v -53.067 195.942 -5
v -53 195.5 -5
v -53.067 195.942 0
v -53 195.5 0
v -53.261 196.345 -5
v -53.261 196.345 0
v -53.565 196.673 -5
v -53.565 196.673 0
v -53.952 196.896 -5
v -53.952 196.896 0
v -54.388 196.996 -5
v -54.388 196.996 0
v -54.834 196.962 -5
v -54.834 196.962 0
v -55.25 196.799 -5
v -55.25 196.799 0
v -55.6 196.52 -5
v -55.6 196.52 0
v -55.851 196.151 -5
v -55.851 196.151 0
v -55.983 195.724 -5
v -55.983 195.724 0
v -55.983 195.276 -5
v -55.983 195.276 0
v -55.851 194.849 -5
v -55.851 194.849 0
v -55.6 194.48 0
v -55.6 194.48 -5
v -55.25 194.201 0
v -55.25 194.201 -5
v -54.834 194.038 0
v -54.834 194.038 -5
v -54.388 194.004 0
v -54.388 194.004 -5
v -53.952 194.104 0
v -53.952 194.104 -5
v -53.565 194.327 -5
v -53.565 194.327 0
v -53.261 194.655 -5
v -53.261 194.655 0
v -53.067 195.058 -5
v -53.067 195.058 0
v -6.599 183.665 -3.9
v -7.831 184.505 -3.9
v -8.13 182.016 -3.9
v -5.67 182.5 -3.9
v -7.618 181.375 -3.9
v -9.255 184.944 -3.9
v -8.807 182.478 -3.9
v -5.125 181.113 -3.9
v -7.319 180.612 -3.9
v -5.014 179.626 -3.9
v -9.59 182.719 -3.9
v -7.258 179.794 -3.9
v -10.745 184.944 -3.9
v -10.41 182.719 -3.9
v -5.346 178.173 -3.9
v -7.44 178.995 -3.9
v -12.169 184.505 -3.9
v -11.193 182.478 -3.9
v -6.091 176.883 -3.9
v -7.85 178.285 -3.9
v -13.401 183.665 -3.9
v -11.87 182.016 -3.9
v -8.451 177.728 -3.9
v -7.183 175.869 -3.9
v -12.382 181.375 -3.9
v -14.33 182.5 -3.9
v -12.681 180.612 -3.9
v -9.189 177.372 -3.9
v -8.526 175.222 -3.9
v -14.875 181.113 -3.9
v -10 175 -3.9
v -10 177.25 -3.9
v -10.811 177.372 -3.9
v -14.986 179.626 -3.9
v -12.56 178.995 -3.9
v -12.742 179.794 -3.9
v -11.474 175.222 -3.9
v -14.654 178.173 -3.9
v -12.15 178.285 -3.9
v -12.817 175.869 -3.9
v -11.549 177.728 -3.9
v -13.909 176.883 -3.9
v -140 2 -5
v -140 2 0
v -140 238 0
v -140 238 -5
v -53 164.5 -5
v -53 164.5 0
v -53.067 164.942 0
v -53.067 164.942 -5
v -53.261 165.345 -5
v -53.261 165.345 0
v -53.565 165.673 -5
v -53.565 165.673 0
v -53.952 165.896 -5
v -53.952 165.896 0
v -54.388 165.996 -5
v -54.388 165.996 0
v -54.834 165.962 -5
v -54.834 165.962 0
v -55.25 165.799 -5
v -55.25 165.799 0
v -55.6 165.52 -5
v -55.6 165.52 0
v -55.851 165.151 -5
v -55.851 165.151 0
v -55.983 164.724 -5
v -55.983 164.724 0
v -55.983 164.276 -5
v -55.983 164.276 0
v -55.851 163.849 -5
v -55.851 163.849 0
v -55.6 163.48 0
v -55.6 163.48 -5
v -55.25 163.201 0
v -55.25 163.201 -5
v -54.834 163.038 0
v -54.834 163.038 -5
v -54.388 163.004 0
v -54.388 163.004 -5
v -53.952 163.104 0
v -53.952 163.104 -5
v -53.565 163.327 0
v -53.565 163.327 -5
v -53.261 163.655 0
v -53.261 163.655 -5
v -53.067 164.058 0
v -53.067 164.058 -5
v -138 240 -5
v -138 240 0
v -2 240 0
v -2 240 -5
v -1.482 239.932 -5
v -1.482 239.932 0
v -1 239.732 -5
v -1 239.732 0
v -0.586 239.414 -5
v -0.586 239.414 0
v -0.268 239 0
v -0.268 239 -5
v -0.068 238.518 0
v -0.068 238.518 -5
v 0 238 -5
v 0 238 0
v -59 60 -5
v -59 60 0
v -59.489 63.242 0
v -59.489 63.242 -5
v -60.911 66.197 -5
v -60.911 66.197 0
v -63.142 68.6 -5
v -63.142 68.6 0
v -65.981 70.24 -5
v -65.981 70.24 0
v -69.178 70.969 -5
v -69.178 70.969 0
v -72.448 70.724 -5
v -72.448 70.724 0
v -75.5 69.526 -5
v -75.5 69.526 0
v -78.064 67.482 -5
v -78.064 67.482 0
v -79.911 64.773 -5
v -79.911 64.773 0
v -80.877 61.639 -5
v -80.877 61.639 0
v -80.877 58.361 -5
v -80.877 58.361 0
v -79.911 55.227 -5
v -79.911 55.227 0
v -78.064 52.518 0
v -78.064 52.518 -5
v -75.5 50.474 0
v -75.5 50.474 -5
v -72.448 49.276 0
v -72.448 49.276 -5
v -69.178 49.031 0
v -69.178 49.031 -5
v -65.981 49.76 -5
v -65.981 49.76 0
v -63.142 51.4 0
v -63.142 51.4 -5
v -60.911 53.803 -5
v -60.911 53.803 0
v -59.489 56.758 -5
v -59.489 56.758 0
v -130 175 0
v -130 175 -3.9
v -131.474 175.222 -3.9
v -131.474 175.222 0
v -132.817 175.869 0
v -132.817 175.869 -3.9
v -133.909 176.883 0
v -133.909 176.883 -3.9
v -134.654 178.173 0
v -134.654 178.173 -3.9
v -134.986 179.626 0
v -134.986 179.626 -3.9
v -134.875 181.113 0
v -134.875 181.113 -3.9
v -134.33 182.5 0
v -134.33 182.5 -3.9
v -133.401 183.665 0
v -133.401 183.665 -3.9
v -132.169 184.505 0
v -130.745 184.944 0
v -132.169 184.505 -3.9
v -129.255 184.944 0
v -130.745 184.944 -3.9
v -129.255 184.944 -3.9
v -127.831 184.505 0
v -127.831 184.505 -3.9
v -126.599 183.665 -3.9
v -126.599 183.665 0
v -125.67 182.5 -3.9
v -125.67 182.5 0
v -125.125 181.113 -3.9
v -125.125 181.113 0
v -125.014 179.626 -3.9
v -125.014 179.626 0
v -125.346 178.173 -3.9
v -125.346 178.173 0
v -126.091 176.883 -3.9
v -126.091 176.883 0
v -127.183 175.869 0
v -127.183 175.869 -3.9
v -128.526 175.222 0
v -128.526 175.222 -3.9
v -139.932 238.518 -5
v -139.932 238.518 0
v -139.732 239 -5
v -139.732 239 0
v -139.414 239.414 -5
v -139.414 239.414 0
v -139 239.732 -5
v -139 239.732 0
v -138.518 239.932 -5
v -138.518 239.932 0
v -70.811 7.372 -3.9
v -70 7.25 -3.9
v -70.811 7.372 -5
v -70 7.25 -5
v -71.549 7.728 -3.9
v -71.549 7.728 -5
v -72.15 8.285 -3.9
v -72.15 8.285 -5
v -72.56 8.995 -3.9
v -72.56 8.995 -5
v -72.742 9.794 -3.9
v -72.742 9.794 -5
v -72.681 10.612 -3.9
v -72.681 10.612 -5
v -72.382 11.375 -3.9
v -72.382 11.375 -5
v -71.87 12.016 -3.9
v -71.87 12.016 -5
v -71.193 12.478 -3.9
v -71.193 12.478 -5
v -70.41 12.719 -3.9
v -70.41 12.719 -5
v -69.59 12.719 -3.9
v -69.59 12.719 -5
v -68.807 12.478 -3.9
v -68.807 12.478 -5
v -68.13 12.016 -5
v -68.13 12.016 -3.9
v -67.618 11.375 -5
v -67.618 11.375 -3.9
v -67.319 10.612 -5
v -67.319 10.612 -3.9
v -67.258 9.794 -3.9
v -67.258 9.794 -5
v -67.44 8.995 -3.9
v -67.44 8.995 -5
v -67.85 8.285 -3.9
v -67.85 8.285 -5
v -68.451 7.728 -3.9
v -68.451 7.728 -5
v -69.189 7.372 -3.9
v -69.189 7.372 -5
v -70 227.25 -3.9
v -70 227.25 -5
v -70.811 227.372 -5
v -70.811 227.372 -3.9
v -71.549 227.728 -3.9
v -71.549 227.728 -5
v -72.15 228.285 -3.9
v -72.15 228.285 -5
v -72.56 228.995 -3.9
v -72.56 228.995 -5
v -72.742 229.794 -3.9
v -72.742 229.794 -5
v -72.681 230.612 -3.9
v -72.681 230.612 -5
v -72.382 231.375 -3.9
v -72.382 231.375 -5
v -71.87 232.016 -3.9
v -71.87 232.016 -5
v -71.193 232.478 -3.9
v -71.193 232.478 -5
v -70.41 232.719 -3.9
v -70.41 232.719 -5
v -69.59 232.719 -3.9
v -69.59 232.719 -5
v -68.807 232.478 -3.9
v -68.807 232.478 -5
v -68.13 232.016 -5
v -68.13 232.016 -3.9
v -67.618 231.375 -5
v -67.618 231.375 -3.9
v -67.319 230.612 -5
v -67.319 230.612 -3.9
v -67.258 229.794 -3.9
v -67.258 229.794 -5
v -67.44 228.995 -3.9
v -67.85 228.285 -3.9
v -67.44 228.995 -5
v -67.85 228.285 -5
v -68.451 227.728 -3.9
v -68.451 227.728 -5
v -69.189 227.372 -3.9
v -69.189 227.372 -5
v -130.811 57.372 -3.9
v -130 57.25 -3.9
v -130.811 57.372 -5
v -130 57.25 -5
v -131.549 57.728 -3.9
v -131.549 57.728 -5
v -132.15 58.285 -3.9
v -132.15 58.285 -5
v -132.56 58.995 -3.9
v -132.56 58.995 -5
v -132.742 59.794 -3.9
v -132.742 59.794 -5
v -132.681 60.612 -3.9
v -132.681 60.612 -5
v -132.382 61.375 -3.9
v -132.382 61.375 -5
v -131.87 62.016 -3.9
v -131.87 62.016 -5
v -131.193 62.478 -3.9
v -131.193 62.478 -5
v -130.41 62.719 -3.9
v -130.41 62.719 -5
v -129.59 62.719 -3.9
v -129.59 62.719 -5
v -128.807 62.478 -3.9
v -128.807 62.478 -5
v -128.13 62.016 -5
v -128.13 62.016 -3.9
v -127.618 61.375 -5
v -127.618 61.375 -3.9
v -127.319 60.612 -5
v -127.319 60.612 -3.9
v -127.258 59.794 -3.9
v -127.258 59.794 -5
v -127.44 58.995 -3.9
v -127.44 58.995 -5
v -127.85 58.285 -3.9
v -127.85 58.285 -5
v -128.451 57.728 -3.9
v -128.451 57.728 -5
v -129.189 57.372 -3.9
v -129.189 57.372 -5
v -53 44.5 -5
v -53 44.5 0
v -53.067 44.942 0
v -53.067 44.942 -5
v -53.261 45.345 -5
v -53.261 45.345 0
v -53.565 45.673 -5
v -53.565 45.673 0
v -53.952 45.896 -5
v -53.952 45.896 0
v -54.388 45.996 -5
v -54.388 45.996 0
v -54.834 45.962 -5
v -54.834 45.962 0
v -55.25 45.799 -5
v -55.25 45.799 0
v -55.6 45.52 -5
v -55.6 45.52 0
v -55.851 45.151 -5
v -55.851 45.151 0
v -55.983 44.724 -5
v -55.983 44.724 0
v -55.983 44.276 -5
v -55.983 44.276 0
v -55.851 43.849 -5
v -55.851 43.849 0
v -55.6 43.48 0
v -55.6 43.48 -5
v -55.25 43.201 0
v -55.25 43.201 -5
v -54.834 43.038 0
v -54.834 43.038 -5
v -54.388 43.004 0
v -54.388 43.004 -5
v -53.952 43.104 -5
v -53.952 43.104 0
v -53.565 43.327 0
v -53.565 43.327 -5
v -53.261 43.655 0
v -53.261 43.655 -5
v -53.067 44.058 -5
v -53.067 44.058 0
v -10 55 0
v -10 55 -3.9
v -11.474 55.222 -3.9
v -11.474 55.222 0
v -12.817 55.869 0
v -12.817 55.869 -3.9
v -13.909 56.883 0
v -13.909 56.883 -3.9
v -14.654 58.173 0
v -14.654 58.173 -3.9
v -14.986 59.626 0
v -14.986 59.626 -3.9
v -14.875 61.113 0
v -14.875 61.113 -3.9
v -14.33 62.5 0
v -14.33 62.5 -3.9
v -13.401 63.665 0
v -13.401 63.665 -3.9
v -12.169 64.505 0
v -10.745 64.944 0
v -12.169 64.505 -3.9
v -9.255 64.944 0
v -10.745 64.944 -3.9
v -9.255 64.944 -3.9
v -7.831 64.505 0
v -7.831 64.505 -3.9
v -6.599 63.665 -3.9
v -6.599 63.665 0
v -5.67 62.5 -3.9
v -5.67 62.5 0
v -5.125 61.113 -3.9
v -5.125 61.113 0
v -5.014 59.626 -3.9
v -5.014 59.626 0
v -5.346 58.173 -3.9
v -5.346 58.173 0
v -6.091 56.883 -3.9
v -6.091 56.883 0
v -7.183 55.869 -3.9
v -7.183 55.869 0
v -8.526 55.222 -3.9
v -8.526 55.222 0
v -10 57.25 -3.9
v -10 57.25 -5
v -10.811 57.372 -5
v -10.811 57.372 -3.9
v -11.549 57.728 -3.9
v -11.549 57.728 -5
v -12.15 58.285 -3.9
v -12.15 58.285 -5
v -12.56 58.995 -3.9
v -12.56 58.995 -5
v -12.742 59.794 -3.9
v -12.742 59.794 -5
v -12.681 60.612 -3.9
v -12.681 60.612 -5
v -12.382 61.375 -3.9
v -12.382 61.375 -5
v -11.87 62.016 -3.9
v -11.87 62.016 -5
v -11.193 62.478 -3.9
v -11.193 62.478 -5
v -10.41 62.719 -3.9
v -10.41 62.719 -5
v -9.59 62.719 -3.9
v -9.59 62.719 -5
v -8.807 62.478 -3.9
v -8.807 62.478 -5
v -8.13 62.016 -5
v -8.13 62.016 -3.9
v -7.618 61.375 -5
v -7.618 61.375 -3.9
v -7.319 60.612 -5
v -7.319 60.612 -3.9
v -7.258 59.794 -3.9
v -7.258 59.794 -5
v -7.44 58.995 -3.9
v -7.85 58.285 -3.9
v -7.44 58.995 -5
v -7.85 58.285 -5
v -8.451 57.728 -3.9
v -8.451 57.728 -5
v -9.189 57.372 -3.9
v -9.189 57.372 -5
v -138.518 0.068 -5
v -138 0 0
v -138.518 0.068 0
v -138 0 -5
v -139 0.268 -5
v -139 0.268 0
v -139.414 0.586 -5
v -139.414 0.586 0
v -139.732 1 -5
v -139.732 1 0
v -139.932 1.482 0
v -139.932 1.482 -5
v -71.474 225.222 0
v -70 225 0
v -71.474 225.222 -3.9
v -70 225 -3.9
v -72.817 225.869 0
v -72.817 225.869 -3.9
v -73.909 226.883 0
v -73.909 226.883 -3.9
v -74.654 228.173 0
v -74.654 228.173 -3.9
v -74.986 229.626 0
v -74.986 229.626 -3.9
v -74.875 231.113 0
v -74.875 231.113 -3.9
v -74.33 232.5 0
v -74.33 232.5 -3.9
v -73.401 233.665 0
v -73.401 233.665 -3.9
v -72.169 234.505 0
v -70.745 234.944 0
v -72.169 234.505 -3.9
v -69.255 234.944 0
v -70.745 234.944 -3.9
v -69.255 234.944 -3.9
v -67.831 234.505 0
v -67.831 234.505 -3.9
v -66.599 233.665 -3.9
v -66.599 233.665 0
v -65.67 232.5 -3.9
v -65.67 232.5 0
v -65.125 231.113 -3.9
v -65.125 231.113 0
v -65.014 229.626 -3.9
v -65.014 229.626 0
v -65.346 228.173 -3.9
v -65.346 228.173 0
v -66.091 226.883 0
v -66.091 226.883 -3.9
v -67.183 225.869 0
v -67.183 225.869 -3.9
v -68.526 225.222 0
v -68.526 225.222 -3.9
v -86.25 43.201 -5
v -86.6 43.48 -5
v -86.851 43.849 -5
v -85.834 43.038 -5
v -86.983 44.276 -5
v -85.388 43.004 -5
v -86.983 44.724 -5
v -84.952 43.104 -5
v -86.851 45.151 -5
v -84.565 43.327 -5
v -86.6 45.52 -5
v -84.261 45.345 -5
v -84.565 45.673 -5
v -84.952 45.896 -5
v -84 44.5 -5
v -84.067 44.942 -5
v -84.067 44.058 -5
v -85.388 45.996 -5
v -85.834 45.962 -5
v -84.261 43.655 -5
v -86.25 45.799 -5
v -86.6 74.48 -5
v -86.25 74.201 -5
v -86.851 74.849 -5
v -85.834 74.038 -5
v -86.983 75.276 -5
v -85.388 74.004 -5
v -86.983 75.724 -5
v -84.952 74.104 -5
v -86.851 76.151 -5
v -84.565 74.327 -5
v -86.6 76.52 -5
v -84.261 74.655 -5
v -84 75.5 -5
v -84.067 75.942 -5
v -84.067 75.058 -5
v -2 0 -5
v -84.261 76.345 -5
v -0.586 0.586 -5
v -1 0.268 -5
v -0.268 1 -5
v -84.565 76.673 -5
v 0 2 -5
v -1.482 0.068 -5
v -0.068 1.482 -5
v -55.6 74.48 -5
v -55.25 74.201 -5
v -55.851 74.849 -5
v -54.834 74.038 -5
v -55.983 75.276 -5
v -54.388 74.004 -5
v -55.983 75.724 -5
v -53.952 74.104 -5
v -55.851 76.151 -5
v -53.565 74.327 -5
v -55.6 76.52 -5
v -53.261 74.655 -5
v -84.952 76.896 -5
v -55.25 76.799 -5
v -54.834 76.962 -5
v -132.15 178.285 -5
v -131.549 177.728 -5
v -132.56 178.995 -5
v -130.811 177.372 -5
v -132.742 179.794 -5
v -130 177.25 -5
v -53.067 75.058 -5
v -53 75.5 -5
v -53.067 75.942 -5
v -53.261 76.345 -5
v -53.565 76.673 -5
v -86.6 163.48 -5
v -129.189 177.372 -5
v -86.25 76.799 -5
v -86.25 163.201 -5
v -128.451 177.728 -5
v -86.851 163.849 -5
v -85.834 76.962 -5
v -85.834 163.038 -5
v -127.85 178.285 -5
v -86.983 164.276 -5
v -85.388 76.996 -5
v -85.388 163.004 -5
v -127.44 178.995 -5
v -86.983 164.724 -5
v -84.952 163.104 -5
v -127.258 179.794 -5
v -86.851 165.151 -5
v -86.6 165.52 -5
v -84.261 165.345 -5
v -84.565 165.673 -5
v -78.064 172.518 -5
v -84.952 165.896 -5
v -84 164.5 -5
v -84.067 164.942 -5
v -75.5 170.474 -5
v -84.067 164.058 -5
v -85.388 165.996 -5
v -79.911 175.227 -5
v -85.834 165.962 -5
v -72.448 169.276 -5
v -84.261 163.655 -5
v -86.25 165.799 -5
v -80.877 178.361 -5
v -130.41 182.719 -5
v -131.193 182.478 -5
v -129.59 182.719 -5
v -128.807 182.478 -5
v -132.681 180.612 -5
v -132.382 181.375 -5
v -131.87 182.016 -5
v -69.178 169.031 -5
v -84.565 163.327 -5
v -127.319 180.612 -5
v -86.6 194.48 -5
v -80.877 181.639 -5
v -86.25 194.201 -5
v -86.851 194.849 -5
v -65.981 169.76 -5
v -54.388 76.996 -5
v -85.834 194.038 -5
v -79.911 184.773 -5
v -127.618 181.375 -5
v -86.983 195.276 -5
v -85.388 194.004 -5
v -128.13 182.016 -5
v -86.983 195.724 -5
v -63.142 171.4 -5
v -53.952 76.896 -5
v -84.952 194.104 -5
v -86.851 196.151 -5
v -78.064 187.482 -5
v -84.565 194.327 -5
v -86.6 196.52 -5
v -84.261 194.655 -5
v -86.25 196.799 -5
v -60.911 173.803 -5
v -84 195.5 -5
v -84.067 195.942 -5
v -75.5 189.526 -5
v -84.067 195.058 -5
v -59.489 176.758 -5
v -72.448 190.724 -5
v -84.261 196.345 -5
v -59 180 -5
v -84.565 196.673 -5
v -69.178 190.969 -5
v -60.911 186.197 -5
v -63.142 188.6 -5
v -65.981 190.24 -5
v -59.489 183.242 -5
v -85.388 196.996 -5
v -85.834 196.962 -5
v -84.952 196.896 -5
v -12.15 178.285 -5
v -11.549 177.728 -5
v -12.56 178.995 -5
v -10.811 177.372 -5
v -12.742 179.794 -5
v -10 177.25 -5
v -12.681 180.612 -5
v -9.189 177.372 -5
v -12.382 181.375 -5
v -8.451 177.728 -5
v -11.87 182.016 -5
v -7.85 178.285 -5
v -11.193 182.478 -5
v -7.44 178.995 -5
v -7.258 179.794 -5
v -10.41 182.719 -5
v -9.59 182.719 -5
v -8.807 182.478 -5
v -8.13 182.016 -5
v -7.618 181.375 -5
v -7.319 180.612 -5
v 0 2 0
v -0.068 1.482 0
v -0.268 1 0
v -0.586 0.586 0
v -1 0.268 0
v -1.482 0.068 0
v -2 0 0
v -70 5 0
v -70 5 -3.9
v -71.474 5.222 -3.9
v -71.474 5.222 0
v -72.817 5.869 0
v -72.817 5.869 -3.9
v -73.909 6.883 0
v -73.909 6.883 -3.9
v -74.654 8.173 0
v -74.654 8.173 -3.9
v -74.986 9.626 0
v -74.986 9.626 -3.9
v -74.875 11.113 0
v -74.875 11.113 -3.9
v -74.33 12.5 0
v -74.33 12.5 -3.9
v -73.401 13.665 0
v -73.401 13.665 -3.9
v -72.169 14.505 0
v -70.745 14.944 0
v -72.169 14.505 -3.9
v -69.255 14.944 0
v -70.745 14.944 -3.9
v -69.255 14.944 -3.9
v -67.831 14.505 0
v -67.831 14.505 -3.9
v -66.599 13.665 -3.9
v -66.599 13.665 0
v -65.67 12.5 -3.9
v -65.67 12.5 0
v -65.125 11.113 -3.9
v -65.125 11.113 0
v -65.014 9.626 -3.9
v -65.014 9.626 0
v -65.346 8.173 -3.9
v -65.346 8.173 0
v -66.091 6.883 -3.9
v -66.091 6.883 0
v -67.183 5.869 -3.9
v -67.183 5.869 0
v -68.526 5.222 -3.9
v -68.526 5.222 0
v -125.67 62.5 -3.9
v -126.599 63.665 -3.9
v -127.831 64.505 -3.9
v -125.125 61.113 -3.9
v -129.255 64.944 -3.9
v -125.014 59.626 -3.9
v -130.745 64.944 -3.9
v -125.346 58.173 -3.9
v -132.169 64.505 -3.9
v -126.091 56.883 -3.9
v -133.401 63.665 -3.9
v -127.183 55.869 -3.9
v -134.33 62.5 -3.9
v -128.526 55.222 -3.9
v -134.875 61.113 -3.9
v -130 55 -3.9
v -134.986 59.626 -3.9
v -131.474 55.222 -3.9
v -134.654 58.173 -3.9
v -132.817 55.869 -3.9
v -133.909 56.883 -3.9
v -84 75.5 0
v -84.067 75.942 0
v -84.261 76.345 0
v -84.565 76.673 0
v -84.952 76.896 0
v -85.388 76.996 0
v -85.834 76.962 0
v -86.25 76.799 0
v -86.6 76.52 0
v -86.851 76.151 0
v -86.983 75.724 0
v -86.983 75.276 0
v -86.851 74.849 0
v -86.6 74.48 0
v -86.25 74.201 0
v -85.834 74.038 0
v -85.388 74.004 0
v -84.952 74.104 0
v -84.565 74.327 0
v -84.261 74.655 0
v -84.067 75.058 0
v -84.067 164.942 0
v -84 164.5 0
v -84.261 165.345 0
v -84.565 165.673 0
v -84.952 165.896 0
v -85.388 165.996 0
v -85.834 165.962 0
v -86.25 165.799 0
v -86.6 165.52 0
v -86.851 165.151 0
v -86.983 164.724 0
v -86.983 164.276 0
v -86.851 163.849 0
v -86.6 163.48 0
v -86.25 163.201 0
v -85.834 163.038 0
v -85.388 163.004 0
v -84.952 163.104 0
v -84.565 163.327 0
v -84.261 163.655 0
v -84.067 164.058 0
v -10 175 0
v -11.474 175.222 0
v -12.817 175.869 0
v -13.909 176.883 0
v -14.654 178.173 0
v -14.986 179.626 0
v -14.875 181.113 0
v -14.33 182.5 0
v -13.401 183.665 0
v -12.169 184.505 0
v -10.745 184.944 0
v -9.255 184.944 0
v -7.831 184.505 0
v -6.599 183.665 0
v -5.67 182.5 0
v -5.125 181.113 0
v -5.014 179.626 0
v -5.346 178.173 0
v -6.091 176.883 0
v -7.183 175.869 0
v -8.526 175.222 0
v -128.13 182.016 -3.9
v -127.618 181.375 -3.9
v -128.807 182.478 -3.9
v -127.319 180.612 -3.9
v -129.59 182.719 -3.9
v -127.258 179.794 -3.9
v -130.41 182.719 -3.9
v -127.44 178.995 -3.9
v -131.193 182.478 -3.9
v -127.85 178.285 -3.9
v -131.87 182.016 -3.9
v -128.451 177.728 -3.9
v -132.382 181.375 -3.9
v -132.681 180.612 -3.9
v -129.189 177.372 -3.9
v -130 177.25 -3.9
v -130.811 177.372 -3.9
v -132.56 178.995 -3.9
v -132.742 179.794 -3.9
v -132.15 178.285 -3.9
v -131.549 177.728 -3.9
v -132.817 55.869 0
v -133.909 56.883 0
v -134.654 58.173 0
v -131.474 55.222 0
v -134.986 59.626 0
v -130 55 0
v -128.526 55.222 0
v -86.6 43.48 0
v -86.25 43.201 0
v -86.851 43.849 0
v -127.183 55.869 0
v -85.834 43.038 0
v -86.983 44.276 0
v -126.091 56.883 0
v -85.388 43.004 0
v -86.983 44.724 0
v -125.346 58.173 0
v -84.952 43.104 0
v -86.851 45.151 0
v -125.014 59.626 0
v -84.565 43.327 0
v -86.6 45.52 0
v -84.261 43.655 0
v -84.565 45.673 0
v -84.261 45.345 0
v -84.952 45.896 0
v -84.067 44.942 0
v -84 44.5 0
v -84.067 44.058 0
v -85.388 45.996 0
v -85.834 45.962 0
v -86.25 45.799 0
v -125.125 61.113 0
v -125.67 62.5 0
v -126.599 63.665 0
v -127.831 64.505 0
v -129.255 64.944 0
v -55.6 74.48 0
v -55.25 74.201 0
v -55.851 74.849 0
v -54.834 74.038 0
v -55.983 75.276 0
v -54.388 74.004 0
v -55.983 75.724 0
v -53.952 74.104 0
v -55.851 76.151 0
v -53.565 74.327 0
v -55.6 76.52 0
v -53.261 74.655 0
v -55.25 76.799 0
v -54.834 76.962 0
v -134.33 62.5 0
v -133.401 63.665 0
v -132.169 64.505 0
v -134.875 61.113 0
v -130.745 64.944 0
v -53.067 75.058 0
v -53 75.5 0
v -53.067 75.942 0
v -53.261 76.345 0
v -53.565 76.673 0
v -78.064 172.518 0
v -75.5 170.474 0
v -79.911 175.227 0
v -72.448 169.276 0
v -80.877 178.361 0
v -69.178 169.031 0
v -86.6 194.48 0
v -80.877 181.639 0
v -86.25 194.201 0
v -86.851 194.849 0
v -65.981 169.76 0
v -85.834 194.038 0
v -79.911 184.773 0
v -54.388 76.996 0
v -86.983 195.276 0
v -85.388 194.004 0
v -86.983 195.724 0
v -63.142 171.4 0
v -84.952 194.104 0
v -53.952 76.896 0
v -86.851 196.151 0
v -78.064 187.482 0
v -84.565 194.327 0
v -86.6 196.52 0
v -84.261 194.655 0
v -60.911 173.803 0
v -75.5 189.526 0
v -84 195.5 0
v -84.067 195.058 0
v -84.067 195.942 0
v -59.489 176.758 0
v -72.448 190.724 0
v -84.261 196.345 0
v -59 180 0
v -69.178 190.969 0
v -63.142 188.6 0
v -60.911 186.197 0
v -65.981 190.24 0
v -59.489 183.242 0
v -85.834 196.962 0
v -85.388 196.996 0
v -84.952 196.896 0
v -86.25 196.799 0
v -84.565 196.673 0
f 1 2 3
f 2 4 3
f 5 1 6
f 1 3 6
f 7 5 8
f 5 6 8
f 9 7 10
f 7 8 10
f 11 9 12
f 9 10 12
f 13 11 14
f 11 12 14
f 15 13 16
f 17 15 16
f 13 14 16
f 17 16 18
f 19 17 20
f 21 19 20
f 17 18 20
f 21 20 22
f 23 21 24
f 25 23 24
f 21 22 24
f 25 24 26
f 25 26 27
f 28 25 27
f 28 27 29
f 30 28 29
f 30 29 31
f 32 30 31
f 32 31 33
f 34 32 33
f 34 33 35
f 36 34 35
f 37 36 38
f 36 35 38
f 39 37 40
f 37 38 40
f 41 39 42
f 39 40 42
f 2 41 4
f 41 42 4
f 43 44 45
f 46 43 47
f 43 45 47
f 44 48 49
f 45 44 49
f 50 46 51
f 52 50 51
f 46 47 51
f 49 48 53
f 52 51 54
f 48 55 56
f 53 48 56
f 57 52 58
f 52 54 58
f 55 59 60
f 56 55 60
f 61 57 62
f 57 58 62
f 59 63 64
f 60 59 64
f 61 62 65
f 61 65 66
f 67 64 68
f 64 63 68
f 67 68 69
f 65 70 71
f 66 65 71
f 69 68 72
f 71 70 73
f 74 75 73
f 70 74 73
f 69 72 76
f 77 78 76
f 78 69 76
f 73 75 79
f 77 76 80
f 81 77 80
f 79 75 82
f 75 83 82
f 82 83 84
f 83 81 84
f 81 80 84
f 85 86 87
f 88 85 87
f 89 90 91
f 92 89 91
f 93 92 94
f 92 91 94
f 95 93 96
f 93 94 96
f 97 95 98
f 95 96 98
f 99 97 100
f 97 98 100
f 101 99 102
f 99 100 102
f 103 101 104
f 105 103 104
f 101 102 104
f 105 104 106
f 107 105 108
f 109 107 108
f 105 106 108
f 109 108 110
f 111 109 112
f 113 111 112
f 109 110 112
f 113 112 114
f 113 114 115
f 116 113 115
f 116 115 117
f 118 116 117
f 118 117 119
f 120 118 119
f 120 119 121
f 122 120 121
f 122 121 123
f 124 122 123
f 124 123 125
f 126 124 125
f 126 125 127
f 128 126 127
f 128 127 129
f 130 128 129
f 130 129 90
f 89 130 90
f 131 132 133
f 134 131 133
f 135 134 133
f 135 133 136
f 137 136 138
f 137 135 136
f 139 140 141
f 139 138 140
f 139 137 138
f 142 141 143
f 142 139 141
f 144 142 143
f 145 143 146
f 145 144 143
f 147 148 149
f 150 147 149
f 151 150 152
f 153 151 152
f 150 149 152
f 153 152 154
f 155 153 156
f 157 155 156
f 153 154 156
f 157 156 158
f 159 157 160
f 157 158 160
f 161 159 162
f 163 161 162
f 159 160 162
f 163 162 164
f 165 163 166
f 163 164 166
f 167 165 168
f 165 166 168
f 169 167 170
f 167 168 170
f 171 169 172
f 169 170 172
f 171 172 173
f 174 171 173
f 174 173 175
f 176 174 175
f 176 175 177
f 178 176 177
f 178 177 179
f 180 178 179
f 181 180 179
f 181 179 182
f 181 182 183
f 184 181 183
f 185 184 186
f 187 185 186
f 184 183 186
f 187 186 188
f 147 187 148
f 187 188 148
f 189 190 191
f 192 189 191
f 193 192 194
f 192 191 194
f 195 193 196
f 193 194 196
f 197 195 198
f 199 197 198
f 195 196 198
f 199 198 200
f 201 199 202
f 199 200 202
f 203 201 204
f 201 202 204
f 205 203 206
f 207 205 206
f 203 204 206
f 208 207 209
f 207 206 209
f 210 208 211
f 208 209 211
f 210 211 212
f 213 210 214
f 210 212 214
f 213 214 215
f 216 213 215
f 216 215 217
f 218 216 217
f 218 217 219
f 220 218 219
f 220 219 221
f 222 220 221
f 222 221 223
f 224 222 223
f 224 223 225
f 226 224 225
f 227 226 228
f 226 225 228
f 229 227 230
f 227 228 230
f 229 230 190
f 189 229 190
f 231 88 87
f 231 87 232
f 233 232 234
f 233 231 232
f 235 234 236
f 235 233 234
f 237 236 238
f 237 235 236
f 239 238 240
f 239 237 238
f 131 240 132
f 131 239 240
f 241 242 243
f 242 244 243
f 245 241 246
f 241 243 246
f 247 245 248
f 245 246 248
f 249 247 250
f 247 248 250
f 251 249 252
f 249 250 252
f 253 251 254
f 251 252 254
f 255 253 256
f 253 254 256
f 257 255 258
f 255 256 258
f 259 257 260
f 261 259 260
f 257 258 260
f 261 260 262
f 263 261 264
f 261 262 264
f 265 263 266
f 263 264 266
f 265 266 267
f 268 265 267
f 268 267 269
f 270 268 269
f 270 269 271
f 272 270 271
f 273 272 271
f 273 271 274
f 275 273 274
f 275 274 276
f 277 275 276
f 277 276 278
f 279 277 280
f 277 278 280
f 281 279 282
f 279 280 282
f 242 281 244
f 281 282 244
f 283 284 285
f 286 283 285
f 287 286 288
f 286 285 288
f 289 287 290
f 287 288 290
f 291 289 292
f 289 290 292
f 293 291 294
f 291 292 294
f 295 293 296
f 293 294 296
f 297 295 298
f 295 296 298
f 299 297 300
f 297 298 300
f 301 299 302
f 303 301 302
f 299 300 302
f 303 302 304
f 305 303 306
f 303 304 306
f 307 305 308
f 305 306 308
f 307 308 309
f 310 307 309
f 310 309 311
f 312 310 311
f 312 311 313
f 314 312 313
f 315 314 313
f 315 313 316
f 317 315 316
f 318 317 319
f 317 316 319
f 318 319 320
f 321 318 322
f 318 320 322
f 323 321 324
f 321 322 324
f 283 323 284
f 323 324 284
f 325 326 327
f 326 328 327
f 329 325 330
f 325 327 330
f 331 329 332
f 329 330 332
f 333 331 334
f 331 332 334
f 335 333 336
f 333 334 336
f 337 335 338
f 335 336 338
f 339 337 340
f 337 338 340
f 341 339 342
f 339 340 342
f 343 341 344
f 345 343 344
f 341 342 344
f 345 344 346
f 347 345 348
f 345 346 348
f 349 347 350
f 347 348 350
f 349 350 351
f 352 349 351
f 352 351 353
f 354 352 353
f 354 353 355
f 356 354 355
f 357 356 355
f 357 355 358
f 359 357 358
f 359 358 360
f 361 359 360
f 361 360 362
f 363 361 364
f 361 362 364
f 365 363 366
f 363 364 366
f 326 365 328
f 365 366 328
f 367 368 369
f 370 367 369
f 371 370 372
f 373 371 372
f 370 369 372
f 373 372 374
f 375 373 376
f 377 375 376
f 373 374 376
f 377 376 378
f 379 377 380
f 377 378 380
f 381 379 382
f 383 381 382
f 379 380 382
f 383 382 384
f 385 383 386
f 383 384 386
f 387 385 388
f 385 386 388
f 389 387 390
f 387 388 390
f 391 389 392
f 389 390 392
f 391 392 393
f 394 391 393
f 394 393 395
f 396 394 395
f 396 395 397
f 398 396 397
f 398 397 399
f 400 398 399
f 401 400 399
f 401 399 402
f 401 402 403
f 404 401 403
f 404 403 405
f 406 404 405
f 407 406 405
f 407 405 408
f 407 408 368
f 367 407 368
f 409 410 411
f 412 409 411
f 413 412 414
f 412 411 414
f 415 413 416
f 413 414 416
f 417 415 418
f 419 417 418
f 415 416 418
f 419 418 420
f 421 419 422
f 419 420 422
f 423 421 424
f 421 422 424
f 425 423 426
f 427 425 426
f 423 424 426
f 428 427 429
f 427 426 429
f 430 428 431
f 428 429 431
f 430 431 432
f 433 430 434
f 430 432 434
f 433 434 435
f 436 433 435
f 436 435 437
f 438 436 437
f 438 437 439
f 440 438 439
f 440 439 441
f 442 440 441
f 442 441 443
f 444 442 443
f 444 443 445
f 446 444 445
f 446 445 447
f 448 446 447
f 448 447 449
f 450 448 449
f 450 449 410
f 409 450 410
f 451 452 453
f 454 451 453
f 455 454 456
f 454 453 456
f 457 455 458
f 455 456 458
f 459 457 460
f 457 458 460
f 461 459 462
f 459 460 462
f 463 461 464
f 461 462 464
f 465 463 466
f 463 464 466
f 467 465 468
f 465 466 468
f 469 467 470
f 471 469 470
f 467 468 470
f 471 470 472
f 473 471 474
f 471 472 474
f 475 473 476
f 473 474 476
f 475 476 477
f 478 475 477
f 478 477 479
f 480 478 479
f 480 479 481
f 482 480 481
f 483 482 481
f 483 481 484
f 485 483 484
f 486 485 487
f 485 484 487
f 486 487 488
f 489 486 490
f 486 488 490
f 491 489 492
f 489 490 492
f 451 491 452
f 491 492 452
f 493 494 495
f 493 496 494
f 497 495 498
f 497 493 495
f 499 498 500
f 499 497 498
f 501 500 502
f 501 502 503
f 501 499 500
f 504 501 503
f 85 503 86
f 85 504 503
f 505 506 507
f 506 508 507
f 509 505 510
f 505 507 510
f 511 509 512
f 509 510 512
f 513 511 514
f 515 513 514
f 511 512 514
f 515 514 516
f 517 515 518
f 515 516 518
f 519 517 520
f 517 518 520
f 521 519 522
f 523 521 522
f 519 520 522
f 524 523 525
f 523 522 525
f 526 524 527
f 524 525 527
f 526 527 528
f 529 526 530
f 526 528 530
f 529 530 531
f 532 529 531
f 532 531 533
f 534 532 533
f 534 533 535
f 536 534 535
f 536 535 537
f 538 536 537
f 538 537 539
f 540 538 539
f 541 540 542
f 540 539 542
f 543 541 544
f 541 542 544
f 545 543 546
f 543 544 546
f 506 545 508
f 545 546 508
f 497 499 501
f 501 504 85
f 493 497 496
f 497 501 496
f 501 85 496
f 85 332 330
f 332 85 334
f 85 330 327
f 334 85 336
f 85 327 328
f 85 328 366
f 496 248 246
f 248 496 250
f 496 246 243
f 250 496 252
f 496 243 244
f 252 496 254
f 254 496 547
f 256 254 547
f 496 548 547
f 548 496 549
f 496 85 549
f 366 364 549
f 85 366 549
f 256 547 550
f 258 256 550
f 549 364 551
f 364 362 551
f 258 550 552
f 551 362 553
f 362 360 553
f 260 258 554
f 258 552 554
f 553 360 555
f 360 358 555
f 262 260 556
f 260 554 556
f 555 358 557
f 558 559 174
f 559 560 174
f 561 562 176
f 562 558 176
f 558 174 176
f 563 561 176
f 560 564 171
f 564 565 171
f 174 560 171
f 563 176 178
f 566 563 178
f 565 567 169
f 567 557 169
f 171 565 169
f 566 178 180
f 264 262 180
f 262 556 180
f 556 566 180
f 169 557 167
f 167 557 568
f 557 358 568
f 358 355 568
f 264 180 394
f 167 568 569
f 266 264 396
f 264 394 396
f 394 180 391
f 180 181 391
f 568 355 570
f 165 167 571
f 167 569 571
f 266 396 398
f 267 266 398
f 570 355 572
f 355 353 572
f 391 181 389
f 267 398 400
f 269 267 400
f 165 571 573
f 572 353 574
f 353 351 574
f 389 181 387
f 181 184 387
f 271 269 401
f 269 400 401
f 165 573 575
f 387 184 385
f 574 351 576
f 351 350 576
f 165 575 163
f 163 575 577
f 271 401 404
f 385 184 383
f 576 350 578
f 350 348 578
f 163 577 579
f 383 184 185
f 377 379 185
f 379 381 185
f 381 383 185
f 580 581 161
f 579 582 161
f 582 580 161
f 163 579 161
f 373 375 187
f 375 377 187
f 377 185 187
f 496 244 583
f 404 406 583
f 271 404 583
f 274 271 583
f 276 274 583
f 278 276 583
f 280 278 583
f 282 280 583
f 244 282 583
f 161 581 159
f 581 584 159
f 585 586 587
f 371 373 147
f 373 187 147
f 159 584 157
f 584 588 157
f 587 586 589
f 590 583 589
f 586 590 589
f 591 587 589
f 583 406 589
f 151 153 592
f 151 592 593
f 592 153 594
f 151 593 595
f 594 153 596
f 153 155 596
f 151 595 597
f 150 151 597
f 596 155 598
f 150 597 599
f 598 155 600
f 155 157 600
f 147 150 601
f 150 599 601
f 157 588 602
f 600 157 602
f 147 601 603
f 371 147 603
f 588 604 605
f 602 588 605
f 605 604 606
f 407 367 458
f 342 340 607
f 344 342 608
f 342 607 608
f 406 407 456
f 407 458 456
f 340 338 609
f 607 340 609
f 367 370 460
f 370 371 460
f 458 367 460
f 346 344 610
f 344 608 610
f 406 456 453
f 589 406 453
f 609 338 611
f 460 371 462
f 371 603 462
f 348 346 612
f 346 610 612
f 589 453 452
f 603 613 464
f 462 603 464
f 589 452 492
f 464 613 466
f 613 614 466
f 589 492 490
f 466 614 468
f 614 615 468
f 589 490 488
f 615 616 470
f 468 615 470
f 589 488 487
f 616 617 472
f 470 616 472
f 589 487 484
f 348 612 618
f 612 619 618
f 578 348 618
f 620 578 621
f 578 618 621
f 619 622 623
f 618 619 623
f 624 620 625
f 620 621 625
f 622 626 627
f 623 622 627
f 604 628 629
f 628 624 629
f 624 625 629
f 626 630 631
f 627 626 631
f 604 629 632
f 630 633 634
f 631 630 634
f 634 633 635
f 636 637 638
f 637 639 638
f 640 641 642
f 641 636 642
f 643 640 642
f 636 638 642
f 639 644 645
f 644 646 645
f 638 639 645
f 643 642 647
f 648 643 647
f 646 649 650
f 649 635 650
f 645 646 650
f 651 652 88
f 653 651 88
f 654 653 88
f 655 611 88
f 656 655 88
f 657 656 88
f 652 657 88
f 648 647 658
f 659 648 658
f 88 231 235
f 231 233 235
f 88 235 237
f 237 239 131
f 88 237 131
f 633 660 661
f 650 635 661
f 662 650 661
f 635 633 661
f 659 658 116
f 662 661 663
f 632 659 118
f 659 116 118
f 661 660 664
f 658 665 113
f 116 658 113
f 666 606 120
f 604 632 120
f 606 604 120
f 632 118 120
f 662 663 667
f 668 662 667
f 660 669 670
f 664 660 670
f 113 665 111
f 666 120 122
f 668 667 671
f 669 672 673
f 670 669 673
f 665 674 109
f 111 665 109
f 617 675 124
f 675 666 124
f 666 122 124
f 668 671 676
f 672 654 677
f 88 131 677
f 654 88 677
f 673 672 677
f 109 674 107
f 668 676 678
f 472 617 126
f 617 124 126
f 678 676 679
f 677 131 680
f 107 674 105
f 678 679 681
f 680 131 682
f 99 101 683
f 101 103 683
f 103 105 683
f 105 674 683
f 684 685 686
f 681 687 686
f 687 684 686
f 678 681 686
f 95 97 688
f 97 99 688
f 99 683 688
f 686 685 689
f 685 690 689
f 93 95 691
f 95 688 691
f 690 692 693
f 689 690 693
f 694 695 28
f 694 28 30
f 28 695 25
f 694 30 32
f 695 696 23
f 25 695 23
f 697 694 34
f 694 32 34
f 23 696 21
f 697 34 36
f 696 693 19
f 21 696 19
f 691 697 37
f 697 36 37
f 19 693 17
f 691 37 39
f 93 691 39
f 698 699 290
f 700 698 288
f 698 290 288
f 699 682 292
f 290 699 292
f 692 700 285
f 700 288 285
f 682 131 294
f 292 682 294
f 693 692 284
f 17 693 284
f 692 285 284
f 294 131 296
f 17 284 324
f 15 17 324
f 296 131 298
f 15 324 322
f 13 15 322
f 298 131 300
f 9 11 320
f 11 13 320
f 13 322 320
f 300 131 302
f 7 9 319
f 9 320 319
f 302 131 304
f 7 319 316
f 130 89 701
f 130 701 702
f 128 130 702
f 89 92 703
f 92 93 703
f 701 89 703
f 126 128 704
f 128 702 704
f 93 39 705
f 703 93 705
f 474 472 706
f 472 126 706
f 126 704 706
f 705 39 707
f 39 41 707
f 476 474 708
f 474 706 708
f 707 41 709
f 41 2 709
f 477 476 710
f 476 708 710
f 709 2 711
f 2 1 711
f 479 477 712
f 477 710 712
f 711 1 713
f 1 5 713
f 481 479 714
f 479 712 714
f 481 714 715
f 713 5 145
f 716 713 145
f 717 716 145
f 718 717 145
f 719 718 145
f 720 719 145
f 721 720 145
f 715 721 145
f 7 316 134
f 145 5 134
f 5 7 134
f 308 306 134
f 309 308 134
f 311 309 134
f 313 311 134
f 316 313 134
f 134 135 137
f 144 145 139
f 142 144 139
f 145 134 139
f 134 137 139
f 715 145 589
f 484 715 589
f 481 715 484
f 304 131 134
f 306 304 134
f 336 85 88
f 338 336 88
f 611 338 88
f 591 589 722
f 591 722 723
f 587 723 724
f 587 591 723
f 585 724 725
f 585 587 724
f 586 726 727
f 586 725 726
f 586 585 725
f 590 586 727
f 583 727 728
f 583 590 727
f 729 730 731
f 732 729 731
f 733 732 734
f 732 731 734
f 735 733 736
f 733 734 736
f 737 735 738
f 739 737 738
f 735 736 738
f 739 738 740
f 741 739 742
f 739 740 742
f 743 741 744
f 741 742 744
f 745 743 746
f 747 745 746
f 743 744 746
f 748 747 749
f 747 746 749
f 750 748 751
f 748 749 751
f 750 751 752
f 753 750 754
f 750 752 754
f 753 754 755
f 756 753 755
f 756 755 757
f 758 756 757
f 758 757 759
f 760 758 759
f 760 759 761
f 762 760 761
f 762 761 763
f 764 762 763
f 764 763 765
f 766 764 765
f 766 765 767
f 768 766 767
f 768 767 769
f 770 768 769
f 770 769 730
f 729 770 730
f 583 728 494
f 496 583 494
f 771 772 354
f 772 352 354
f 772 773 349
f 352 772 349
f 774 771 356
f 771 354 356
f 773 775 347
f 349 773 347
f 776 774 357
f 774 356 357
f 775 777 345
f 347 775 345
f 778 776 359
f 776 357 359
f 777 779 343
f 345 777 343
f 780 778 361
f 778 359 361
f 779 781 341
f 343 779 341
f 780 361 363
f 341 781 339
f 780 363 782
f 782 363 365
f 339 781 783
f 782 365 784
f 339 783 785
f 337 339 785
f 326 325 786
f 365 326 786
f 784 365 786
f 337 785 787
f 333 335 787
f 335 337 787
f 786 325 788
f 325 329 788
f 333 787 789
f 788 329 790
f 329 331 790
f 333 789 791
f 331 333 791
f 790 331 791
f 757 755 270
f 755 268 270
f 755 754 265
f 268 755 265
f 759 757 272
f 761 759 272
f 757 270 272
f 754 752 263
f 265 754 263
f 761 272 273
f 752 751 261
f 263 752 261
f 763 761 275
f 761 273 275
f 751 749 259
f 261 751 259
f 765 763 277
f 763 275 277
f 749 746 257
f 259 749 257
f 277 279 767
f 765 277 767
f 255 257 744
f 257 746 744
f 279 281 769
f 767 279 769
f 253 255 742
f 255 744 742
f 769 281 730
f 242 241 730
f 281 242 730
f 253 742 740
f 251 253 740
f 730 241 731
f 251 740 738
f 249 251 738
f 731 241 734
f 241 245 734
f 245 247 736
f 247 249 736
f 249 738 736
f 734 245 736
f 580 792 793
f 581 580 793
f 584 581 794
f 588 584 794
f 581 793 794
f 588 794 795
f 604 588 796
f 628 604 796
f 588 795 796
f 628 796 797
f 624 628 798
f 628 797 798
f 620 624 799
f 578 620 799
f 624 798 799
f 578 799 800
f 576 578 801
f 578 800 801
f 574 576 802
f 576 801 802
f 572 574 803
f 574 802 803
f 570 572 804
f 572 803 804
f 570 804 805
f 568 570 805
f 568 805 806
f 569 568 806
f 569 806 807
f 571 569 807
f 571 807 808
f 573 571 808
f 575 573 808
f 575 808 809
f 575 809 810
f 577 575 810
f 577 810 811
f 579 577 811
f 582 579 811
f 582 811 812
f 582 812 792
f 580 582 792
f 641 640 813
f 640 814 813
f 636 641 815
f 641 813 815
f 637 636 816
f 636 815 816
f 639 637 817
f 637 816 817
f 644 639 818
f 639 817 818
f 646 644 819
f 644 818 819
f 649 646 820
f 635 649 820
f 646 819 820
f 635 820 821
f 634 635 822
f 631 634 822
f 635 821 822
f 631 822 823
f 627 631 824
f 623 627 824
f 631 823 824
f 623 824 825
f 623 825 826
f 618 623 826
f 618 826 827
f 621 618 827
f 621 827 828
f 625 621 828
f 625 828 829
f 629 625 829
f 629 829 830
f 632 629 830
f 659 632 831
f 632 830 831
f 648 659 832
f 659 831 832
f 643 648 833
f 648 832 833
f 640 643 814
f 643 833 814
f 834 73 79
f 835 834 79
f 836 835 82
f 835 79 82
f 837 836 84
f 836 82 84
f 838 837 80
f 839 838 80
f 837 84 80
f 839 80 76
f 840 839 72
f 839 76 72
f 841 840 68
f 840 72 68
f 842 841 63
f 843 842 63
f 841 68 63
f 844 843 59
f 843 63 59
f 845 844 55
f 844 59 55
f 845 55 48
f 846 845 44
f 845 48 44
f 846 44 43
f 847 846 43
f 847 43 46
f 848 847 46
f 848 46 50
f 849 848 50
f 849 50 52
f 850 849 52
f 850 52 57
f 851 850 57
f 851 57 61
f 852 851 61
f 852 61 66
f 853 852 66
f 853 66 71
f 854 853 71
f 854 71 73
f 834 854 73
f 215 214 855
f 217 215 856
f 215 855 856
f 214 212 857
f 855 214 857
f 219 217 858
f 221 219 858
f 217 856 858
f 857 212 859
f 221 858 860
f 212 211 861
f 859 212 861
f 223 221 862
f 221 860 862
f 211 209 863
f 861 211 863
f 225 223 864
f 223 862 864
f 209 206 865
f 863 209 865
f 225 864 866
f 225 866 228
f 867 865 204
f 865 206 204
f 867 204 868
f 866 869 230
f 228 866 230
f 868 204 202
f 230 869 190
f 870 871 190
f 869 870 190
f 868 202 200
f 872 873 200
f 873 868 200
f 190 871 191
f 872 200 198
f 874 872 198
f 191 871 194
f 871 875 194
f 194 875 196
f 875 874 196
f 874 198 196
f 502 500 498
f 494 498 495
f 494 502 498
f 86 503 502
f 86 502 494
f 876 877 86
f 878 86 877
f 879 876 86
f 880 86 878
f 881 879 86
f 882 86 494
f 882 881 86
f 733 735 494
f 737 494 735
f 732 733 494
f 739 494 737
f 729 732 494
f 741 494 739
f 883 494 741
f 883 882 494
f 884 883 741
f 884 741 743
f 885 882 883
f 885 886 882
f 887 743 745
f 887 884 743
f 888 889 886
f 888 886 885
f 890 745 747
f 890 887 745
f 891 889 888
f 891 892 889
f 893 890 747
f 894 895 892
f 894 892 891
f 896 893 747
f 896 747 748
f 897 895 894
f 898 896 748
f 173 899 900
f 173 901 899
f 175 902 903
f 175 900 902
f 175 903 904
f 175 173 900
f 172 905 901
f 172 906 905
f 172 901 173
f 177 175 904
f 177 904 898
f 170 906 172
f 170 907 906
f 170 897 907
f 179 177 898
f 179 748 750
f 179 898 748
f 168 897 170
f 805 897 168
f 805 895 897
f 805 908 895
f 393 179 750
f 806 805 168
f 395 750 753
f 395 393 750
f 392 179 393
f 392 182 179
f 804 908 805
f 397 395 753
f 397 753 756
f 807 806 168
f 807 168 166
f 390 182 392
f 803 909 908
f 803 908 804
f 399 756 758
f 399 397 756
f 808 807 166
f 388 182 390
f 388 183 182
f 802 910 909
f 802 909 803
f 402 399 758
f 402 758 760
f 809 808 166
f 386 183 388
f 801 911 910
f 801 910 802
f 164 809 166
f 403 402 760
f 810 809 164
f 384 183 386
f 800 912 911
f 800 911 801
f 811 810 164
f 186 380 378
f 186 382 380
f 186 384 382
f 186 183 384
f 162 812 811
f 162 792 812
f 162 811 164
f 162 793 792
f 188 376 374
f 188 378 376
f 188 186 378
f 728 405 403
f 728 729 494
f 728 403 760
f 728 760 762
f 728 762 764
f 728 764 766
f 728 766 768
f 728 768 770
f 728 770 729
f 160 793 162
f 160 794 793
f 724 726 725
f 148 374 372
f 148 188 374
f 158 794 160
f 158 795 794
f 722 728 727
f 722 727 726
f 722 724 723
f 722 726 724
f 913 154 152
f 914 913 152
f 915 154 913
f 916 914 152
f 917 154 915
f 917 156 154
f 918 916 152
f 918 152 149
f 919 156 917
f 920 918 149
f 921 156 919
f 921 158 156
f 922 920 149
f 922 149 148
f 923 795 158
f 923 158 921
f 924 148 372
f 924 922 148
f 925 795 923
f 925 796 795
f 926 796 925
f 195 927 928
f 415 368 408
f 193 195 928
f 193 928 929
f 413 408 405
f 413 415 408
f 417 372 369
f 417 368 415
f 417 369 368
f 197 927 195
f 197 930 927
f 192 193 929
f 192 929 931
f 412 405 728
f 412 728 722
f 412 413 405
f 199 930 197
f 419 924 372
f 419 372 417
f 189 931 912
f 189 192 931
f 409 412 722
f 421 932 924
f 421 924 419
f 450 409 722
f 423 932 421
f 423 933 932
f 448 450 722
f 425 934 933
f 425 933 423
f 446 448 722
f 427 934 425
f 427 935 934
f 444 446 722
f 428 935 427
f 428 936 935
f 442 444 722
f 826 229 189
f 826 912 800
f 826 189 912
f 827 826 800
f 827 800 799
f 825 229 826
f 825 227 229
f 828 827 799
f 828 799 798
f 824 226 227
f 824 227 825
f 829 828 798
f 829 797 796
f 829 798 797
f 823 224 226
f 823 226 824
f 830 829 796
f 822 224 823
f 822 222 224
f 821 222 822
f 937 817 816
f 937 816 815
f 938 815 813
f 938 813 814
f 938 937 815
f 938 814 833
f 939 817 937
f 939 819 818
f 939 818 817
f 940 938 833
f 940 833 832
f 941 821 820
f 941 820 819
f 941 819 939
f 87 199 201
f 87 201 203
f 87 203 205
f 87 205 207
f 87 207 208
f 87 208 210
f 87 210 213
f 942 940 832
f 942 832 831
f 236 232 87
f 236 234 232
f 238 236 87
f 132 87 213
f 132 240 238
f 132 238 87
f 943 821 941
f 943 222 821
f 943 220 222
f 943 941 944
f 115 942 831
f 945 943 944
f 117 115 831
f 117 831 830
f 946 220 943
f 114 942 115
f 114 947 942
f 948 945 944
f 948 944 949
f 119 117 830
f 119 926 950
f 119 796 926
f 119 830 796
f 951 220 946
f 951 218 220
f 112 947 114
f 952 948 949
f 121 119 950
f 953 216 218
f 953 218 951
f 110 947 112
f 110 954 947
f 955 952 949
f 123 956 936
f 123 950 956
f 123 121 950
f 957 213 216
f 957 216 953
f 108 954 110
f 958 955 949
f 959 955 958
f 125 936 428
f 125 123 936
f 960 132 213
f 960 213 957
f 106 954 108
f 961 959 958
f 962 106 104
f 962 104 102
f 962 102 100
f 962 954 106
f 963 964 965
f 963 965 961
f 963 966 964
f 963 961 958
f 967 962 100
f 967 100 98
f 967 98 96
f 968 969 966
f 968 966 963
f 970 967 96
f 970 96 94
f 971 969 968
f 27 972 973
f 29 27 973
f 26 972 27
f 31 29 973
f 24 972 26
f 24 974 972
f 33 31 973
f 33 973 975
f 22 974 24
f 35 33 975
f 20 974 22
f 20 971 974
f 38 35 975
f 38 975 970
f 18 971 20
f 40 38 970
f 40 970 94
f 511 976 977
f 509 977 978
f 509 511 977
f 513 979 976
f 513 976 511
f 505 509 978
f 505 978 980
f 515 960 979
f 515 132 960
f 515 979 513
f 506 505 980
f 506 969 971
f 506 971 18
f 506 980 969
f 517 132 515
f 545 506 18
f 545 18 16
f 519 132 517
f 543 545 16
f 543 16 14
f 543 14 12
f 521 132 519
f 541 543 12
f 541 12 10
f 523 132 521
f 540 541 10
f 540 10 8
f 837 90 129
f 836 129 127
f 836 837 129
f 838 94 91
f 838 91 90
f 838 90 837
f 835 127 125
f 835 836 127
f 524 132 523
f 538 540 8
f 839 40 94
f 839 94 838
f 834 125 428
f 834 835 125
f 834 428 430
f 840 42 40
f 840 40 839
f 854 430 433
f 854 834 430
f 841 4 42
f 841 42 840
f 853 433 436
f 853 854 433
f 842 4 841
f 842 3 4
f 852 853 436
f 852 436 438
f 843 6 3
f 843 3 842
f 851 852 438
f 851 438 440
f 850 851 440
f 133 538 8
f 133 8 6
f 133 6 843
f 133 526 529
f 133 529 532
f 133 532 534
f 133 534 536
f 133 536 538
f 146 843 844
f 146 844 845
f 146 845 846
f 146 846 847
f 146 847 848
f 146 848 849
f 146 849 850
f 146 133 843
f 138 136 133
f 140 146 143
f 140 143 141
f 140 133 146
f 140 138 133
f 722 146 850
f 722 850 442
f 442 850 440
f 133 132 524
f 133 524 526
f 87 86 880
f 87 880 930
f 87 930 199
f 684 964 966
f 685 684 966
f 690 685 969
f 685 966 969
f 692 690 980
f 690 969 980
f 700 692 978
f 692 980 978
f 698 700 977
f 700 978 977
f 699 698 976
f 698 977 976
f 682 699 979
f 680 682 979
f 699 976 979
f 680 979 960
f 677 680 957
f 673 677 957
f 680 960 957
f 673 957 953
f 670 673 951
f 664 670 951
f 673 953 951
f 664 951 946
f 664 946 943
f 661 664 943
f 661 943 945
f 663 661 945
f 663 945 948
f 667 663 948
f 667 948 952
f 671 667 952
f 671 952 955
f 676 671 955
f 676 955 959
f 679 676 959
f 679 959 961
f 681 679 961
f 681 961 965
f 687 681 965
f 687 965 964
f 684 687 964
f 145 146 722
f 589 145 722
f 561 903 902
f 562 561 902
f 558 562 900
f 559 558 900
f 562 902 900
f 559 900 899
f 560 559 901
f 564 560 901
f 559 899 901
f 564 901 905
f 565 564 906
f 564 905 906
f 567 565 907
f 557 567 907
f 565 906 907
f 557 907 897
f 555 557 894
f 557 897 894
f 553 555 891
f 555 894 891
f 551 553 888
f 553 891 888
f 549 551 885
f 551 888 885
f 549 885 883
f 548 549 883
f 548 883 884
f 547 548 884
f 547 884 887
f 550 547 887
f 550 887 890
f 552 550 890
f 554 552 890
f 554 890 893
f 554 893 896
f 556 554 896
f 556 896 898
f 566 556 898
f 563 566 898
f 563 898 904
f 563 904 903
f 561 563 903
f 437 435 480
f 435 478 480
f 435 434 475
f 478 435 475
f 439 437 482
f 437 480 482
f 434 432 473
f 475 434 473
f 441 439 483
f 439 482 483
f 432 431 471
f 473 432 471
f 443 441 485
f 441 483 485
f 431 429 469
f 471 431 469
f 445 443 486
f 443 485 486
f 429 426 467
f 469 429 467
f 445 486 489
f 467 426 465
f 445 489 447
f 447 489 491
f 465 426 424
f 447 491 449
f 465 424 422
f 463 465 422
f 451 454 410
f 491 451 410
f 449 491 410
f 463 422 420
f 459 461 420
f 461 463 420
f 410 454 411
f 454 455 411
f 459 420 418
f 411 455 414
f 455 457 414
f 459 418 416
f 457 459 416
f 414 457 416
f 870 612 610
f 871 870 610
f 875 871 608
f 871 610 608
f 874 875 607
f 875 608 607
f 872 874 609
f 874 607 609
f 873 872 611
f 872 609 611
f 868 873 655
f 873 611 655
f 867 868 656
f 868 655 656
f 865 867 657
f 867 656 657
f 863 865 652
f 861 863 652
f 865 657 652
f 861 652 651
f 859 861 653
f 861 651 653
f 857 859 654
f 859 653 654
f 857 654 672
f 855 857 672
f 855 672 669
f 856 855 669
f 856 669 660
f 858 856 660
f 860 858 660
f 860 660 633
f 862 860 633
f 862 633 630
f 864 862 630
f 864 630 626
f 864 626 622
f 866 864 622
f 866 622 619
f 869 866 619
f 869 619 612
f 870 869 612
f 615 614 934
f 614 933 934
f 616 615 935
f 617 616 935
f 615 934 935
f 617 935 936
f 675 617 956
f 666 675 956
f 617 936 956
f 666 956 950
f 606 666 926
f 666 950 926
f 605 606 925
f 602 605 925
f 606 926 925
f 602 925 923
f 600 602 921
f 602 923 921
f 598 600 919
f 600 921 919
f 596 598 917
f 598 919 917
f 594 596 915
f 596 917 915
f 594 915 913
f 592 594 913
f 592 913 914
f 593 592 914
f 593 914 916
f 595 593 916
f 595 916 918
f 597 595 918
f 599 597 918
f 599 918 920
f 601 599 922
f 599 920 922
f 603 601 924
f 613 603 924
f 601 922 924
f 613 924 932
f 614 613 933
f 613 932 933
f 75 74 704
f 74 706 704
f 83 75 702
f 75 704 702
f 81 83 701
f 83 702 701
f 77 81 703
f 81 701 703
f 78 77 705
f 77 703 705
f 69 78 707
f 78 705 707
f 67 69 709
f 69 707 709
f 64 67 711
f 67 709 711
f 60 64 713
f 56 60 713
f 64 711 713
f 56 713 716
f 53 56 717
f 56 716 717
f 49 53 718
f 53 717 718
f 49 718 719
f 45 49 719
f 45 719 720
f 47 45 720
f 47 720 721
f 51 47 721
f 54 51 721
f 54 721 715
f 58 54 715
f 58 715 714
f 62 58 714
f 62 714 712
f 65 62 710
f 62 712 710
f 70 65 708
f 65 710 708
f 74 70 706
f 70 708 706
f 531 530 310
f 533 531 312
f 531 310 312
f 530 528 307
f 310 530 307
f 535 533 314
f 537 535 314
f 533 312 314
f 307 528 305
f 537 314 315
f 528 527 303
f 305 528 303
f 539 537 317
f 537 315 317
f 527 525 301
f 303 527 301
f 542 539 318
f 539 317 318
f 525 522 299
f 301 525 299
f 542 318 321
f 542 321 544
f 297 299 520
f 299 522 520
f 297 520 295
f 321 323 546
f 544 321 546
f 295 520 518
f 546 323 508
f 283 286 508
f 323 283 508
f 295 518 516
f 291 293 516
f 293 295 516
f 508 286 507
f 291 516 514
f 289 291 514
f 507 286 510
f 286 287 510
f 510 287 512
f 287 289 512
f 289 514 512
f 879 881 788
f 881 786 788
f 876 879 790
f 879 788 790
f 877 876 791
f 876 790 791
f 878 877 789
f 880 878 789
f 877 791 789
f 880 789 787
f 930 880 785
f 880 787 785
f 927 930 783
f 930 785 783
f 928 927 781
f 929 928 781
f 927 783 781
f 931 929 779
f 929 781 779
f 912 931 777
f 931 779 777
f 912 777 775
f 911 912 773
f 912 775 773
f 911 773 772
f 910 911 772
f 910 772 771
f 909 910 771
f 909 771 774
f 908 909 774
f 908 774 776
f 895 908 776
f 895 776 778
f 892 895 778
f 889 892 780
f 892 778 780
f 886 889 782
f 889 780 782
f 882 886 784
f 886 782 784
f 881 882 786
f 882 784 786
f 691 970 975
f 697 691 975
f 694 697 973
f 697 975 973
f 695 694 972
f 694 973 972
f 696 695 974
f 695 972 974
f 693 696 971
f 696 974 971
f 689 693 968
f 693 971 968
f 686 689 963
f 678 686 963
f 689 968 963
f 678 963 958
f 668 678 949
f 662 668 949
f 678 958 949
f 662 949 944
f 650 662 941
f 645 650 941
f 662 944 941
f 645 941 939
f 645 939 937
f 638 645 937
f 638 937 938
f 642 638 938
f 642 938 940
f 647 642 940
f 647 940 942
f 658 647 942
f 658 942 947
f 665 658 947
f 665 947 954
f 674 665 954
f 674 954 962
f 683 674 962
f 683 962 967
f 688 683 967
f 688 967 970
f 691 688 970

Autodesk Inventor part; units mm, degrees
ref_plane "YZ Plane" through (0, 0, 0) normal (1, 0, 0) x (0, 1, 0)
ref_plane "XZ Plane" through (0, 0, 0) normal (0, 1, 0) x (-1, 0, 0)
sketch "Skizze3" plane through (0, 0, 0) normal (0, 0, 1) x (1, 0, 0)
  line L0 (0, 0) -> (-140, 0)
  line L1 (-140, 0) -> (-140, 120)
  line L2 (-140, 240) -> (0, 240)
  line L3 (0, 240) -> (0, 0)
  line L4 (-34.5565, 44.5) -> (-109.2584, 44.5) construction
  line L5 (-42.5521, 75.5) -> (-110.6291, 75.5) construction
  line L6 (-85.5, 104.3529) -> (-85.5, 36.2759) construction
  line L7 (-54.5, 102.2969) -> (-54.5, 32.1639) construction
  line L8 (-70, -15.9958) -> (-70, 12.0858) construction
  circle A0 centre (-70, 60) radius 11
  circle A1 centre (-85.5, 75.5) radius 1.5
  circle A2 centre (-85.5, 44.5) radius 1.5
  circle A3 centre (-54.5, 44.5) radius 1.5
  circle A4 centre (-54.5, 75.5) radius 1.5
  line L9 (-140, 120) -> (0, 120) construction
  line L10 (-140, 120) -> (-140, 240)
  line L11 (-148.6913, 60) -> (9.8942, 60) construction
  line L12 (-160.7703, 180) -> (-4.1331, 180) construction
  point P0 (-70, 0)
  point P1 (-70, 10)
  point P2 (-130, 60)
  point P3 (-140, 180)
  point P4 (-140, 60)
  point P5 (-130, 180)
  point P6 (-10, 180)
  point P7 (-10, 60)
  point P8 (-70, 230)
  dimension "d4" = 240
  dimension "d5" = 140
  dimension "d6" = 31
  dimension "d7" = 31
  dimension "d8" = 15.5
  dimension "d9" = 15.5
  dimension "d10" = 60
  dimension "d11" = 22
  dimension "d12" = 3
  dimension "d13" = 3
  dimension "d14" = 3
  dimension "d15" = 3
  dimension "d22" = 10
  dimension "d23" = 10
  dimension "d24" = 10
  dimension "d25" = 10
  dimension "d26" = 10
  dimension "d34" = 10
extrude "Extrusion3" add sketch "Skizze3" against normal blind 5 contours L0 L1 L10 L2 L3 | A0 | A1 | A2 | A3 | A4
fillet "Rundung1" radius 2 4 edges at (0, 0, -2.5) (0, 240, -2.5) (-140, 240, -2.5) (-140, 0, -2.5)
ref_plane "Arbeitsebene1" through (-140, 120, 0) normal (0, 1, 0) x (1, 0, 0)
extrude "Extrusion4" cut sketch "Skizze3" against normal through all contours A0 | A1 | A2 | A3 | A4
mirror "Spiegeln1" about plane through (-140, 120, 0) normal (0, 1, 0) of "Extrusion4"
hole "Bohrung1" at (-70, 60, 0) at (-70, 10, 0) at (-130, 60, 0) at (-130, 180, 0) at (-10, 180, 0) at (-10, 60, 0) at (-70, 230, 0) direction (0, 0, -1) diameter 5.5 end through all counterbore diameter 10 counterbore depth 3.9
equation "\"d8\" = 0.5 * d6"
equation "\"d9\" = d8"
equation "\"d23\" = d22"
equation "\"d24\" = d23"
equation "\"d25\" = d22"
equation "\"d26\" = d25"
properties part number "BT001_trajan20_21"
